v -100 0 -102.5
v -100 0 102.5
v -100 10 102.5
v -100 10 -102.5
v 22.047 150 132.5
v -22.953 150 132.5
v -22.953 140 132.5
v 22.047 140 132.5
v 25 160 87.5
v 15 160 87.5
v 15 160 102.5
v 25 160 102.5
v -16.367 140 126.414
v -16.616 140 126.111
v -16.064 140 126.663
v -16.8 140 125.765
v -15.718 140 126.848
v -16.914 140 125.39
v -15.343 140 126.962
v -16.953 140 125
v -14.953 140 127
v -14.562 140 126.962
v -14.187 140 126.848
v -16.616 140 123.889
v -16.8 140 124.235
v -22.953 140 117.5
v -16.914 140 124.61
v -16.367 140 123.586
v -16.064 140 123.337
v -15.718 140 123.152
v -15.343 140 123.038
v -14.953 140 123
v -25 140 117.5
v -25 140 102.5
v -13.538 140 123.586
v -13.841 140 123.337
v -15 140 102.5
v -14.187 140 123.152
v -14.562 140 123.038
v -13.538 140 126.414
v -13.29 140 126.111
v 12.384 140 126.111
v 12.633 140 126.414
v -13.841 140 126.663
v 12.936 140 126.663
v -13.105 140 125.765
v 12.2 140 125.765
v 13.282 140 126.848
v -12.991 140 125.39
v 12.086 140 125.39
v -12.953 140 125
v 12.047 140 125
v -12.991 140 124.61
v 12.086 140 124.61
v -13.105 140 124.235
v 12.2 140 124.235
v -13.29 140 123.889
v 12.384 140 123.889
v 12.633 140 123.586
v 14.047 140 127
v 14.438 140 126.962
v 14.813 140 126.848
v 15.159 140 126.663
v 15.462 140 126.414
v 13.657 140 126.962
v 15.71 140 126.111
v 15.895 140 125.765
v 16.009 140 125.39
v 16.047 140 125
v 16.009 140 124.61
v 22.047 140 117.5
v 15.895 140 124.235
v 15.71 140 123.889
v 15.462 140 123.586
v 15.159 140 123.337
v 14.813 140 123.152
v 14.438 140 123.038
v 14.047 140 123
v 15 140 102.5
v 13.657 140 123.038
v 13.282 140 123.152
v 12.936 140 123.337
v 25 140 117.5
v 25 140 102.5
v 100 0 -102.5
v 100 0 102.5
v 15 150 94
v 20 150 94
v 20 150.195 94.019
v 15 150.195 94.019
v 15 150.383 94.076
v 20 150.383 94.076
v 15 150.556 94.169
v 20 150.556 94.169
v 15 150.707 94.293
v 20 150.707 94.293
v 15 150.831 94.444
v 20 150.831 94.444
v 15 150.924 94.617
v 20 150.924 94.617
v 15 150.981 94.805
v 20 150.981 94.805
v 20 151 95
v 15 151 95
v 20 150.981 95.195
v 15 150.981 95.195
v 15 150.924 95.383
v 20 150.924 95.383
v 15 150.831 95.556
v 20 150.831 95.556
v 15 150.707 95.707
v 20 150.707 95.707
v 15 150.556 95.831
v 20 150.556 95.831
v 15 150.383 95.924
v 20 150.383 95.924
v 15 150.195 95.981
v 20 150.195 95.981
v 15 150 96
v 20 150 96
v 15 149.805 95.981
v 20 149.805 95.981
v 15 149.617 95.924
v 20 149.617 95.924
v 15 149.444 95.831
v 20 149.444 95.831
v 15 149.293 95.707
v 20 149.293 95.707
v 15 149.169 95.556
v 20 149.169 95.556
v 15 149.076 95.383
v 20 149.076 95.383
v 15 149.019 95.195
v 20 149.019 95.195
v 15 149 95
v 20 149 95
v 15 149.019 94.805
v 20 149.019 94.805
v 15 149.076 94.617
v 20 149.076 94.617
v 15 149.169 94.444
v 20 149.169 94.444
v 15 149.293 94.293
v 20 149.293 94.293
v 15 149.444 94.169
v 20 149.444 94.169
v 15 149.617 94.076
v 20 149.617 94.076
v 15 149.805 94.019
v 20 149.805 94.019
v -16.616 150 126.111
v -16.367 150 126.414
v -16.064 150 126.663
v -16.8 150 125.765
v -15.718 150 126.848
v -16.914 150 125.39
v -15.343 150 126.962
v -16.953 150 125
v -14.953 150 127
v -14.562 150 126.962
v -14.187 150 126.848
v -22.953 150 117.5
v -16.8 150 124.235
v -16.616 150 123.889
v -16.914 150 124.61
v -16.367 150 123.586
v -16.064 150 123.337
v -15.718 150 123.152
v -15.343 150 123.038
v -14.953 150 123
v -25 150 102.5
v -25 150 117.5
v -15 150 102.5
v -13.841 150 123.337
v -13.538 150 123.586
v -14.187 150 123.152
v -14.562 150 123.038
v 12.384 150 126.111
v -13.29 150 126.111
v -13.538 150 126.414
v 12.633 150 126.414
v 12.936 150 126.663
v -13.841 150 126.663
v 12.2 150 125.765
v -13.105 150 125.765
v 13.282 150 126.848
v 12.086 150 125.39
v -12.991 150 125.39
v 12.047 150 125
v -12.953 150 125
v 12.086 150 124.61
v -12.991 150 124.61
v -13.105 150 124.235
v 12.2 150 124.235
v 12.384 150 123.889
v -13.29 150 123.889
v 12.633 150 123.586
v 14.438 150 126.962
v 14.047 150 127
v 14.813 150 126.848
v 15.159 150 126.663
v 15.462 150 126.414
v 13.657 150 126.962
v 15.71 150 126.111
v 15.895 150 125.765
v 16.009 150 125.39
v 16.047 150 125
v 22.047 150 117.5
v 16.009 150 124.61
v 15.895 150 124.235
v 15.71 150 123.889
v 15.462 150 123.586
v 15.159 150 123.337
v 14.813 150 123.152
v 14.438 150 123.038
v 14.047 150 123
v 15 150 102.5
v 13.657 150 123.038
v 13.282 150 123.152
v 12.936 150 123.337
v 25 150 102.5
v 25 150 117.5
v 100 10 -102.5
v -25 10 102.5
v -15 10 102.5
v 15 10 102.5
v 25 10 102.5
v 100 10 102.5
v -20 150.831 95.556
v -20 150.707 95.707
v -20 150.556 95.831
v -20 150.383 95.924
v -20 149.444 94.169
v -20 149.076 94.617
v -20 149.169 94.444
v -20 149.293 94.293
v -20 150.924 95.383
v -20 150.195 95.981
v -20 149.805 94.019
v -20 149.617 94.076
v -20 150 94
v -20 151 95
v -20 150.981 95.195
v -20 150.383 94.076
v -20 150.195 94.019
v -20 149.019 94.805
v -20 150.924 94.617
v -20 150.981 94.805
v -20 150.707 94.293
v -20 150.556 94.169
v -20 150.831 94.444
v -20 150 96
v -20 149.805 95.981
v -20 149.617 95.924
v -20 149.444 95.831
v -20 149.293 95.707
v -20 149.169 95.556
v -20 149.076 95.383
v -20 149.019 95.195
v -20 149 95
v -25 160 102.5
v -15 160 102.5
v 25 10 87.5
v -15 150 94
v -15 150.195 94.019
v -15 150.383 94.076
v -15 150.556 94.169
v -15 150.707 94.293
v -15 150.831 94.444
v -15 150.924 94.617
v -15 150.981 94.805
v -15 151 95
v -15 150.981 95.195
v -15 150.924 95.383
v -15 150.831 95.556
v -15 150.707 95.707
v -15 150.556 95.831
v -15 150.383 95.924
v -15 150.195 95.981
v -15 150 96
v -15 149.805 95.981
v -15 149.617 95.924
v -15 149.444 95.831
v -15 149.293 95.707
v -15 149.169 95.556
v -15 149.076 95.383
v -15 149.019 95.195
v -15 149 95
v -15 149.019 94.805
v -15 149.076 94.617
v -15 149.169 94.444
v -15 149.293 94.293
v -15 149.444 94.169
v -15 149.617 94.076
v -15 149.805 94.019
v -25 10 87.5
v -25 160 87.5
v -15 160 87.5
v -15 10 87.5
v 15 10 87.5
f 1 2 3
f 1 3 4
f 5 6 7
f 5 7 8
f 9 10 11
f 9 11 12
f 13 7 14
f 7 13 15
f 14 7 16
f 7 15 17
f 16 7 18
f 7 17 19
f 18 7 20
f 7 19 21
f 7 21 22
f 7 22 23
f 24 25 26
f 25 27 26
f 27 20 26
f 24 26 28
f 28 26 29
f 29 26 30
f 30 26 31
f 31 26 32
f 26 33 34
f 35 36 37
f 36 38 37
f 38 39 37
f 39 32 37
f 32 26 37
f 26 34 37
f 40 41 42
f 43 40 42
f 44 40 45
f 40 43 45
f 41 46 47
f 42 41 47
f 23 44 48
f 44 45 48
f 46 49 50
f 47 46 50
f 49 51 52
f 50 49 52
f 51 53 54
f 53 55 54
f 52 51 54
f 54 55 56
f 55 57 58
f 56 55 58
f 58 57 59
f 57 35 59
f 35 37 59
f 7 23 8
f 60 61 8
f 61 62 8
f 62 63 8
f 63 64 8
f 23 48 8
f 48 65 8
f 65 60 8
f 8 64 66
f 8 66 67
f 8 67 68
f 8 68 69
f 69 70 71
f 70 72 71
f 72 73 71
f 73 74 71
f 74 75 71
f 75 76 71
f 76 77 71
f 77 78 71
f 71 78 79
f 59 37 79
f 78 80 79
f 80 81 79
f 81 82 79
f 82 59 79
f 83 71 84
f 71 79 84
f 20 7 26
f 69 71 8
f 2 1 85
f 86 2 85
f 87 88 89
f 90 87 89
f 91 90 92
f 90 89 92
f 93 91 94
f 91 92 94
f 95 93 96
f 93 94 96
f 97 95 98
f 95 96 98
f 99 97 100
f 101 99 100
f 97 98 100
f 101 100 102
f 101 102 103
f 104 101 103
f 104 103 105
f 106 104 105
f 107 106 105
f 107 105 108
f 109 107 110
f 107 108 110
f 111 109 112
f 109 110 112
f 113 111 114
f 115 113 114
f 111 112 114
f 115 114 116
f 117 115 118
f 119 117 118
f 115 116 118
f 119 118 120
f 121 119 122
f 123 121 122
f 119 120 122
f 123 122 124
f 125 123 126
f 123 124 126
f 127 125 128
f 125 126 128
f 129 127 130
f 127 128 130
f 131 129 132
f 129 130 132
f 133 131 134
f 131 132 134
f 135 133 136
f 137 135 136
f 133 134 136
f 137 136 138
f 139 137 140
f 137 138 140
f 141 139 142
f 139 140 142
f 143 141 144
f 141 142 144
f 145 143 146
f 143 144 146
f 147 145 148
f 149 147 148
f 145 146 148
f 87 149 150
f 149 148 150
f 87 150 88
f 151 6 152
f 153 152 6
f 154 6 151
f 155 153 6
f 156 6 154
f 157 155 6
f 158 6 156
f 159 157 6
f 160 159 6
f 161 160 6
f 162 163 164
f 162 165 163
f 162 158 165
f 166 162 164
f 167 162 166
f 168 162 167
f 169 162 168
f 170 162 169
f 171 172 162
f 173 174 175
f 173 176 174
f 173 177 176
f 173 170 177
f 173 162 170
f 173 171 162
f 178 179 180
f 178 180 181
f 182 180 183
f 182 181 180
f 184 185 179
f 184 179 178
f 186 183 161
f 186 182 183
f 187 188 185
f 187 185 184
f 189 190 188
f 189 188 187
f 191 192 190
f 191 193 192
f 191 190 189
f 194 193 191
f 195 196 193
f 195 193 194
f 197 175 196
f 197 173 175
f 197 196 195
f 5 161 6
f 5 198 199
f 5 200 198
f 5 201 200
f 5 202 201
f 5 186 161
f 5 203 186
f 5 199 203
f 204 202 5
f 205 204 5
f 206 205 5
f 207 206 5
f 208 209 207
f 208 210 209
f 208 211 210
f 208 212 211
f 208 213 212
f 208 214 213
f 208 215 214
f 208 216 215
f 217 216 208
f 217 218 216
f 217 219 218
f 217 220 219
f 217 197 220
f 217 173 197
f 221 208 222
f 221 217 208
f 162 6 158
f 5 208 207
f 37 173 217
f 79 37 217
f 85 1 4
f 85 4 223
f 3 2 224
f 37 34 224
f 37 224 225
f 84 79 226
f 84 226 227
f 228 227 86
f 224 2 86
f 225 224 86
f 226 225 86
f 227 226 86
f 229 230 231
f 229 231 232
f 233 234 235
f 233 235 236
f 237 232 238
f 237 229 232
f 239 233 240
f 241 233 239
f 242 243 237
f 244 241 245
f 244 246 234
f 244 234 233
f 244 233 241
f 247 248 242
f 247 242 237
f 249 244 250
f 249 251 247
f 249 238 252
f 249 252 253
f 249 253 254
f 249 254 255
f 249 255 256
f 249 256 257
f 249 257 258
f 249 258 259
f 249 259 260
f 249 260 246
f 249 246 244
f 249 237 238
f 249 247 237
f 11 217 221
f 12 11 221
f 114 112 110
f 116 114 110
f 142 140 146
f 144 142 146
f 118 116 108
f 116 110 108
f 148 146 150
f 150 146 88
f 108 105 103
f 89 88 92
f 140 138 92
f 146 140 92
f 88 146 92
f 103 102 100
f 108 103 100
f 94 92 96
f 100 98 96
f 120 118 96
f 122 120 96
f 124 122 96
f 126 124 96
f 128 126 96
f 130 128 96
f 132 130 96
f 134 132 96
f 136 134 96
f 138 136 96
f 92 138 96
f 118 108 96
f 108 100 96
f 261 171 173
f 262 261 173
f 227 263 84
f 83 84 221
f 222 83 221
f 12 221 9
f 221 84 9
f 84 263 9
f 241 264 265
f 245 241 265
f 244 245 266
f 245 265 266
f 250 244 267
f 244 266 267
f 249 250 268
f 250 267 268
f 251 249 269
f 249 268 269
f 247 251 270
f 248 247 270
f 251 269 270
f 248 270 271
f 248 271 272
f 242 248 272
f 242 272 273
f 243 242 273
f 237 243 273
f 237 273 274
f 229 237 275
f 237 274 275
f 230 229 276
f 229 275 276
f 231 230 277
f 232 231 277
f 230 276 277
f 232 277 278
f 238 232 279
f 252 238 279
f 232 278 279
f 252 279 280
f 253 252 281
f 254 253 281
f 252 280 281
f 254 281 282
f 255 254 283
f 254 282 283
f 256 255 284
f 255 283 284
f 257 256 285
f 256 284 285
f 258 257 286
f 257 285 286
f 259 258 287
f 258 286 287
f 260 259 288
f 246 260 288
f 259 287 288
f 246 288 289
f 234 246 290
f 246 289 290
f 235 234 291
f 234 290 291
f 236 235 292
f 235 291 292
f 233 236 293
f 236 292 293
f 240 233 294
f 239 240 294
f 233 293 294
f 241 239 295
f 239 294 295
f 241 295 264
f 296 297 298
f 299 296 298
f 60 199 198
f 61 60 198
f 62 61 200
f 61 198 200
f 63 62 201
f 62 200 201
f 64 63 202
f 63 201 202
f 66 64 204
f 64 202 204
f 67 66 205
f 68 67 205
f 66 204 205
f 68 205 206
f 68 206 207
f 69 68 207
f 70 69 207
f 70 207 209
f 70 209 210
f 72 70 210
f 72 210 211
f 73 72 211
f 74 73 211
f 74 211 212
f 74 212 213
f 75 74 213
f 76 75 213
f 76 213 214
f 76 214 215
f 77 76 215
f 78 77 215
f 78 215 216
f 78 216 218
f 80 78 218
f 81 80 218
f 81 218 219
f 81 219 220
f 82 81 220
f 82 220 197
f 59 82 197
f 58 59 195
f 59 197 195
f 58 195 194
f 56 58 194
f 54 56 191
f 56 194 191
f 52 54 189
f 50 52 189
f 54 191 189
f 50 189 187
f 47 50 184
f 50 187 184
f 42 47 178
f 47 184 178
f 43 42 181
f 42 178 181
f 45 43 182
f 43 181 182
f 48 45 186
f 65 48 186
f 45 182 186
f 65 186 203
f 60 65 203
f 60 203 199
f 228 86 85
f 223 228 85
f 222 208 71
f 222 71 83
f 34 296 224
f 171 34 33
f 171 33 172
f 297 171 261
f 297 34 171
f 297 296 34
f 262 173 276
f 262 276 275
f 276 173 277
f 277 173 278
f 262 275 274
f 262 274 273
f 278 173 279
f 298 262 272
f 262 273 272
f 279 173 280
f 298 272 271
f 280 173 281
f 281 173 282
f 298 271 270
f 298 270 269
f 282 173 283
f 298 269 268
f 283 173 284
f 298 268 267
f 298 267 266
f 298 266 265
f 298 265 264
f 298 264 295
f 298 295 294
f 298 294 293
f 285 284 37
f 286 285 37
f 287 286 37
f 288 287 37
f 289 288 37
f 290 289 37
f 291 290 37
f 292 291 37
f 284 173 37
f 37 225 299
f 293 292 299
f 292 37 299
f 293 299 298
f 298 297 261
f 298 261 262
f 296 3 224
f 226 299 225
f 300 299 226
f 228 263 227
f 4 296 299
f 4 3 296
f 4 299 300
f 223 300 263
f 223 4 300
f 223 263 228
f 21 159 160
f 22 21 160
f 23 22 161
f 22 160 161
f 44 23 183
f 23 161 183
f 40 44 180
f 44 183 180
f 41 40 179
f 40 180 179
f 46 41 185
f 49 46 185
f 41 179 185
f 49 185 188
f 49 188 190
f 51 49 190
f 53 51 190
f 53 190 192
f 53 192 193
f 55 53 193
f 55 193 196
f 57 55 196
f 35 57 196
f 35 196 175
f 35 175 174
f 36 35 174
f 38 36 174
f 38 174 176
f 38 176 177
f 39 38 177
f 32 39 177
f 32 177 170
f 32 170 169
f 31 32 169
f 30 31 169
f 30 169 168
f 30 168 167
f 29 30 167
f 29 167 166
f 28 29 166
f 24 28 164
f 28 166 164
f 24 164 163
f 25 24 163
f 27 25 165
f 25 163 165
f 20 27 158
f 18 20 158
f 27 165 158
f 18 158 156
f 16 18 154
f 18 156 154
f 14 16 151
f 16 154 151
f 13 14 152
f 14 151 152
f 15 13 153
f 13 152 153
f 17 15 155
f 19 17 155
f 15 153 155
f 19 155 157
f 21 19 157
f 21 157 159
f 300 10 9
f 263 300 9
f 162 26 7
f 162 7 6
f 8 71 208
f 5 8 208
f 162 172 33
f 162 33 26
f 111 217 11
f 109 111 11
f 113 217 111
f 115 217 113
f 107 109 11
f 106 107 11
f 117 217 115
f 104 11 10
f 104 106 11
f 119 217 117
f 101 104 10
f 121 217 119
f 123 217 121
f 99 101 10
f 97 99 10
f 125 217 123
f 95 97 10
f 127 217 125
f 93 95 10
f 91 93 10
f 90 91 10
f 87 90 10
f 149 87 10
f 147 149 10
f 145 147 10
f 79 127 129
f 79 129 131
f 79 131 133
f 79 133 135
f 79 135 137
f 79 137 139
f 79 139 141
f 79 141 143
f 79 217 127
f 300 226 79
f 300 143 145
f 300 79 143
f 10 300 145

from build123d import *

# Parameters (mm, degrees)
SKETCH1_W           = 200
SKETCH1_H           = 205
BOSS_EXTRUDE1_DEPTH = 10
SKETCH2_W           = 10
SKETCH2_H           = 15
BOSS_EXTRUDE2_DEPTH = 160
SKETCH4_W           = 50
SKETCH4_H           = 10
BOSS_EXTRUDE3_DEPTH = 15
SKETCH5_W           = 45
SKETCH5_H           = 10
BOSS_EXTRUDE4_DEPTH = 15
SKETCH6_R           = 2
CUT_EXTRUDE1_DEPTH  = 15
SKETCH10_R          = 1
CUT_EXTRUDE2_DEPTH  = 5
CUT_EXTRUDE3_START  = 5
SKETCH7_R           = 1
CUT_EXTRUDE3_DEPTH  = 5


with BuildPart() as part:
    # Sketch1 → Boss-Extrude1 (new body)
    with BuildSketch(Plane(origin=(0, 0, 0), x_dir=(1, 0, 0), z_dir=(0, 1, 0))):
        Rectangle(SKETCH1_W, SKETCH1_H)
    extrude(amount=BOSS_EXTRUDE1_DEPTH)

    # Sketch2 → Boss-Extrude2 (add)
    with BuildSketch(Plane(origin=(0, 0, 0), x_dir=(1, 0, 0), z_dir=(0, 1, 0))):
        with Locations((-20, -95)):
            Rectangle(SKETCH2_W, SKETCH2_H)
        with Locations((20, -95)):
            Rectangle(SKETCH2_W, SKETCH2_H)
    extrude(amount=BOSS_EXTRUDE2_DEPTH)

    # Sketch4 → Boss-Extrude3 (add)
    with BuildSketch(Plane.XY.offset(102.5)):
        with Locations((0, 145)):
            Rectangle(SKETCH4_W, SKETCH4_H)
    extrude(amount=BOSS_EXTRUDE3_DEPTH)

    # Sketch5 → Boss-Extrude4 (add)
    with BuildSketch(Plane.XY.offset(117.5)):
        with Locations((-0.452584592, 145)):
            Rectangle(SKETCH5_W, SKETCH5_H)
    extrude(amount=BOSS_EXTRUDE4_DEPTH)

    # Sketch6 → Cut-Extrude1 (cut)
    with BuildSketch(Plane(origin=(0, 150, 0), x_dir=(1, 0, 0), z_dir=(0, 1, 0))):
        with Locations(Location((-14.952584592, -125, 0), (0, 0, 270))):
            Circle(SKETCH6_R)
        with Locations(Location((14.047415408, -125, 0), (0, 0, 270))):
            Circle(SKETCH6_R)
    extrude(amount=-CUT_EXTRUDE1_DEPTH, mode=Mode.SUBTRACT)

    # Sketch10 → Cut-Extrude2 (cut)
    with BuildSketch(Plane(origin=(-15, 0, 0), x_dir=(0, 0, -1), z_dir=(1, 0, 0))):
        with Locations((-95, 150)):
            Circle(SKETCH10_R)
    extrude(amount=-CUT_EXTRUDE2_DEPTH, mode=Mode.SUBTRACT)

    # Sketch7 → Cut-Extrude3 (cut)
    with BuildSketch(Plane(origin=(15, 0, 0), x_dir=(0, 0, -1), z_dir=(1, 0, 0)).offset(CUT_EXTRUDE3_START)):
        with Locations((-95, 150)):
            Circle(SKETCH7_R)
    extrude(amount=-CUT_EXTRUDE3_DEPTH, mode=Mode.SUBTRACT)


solid = part.part
